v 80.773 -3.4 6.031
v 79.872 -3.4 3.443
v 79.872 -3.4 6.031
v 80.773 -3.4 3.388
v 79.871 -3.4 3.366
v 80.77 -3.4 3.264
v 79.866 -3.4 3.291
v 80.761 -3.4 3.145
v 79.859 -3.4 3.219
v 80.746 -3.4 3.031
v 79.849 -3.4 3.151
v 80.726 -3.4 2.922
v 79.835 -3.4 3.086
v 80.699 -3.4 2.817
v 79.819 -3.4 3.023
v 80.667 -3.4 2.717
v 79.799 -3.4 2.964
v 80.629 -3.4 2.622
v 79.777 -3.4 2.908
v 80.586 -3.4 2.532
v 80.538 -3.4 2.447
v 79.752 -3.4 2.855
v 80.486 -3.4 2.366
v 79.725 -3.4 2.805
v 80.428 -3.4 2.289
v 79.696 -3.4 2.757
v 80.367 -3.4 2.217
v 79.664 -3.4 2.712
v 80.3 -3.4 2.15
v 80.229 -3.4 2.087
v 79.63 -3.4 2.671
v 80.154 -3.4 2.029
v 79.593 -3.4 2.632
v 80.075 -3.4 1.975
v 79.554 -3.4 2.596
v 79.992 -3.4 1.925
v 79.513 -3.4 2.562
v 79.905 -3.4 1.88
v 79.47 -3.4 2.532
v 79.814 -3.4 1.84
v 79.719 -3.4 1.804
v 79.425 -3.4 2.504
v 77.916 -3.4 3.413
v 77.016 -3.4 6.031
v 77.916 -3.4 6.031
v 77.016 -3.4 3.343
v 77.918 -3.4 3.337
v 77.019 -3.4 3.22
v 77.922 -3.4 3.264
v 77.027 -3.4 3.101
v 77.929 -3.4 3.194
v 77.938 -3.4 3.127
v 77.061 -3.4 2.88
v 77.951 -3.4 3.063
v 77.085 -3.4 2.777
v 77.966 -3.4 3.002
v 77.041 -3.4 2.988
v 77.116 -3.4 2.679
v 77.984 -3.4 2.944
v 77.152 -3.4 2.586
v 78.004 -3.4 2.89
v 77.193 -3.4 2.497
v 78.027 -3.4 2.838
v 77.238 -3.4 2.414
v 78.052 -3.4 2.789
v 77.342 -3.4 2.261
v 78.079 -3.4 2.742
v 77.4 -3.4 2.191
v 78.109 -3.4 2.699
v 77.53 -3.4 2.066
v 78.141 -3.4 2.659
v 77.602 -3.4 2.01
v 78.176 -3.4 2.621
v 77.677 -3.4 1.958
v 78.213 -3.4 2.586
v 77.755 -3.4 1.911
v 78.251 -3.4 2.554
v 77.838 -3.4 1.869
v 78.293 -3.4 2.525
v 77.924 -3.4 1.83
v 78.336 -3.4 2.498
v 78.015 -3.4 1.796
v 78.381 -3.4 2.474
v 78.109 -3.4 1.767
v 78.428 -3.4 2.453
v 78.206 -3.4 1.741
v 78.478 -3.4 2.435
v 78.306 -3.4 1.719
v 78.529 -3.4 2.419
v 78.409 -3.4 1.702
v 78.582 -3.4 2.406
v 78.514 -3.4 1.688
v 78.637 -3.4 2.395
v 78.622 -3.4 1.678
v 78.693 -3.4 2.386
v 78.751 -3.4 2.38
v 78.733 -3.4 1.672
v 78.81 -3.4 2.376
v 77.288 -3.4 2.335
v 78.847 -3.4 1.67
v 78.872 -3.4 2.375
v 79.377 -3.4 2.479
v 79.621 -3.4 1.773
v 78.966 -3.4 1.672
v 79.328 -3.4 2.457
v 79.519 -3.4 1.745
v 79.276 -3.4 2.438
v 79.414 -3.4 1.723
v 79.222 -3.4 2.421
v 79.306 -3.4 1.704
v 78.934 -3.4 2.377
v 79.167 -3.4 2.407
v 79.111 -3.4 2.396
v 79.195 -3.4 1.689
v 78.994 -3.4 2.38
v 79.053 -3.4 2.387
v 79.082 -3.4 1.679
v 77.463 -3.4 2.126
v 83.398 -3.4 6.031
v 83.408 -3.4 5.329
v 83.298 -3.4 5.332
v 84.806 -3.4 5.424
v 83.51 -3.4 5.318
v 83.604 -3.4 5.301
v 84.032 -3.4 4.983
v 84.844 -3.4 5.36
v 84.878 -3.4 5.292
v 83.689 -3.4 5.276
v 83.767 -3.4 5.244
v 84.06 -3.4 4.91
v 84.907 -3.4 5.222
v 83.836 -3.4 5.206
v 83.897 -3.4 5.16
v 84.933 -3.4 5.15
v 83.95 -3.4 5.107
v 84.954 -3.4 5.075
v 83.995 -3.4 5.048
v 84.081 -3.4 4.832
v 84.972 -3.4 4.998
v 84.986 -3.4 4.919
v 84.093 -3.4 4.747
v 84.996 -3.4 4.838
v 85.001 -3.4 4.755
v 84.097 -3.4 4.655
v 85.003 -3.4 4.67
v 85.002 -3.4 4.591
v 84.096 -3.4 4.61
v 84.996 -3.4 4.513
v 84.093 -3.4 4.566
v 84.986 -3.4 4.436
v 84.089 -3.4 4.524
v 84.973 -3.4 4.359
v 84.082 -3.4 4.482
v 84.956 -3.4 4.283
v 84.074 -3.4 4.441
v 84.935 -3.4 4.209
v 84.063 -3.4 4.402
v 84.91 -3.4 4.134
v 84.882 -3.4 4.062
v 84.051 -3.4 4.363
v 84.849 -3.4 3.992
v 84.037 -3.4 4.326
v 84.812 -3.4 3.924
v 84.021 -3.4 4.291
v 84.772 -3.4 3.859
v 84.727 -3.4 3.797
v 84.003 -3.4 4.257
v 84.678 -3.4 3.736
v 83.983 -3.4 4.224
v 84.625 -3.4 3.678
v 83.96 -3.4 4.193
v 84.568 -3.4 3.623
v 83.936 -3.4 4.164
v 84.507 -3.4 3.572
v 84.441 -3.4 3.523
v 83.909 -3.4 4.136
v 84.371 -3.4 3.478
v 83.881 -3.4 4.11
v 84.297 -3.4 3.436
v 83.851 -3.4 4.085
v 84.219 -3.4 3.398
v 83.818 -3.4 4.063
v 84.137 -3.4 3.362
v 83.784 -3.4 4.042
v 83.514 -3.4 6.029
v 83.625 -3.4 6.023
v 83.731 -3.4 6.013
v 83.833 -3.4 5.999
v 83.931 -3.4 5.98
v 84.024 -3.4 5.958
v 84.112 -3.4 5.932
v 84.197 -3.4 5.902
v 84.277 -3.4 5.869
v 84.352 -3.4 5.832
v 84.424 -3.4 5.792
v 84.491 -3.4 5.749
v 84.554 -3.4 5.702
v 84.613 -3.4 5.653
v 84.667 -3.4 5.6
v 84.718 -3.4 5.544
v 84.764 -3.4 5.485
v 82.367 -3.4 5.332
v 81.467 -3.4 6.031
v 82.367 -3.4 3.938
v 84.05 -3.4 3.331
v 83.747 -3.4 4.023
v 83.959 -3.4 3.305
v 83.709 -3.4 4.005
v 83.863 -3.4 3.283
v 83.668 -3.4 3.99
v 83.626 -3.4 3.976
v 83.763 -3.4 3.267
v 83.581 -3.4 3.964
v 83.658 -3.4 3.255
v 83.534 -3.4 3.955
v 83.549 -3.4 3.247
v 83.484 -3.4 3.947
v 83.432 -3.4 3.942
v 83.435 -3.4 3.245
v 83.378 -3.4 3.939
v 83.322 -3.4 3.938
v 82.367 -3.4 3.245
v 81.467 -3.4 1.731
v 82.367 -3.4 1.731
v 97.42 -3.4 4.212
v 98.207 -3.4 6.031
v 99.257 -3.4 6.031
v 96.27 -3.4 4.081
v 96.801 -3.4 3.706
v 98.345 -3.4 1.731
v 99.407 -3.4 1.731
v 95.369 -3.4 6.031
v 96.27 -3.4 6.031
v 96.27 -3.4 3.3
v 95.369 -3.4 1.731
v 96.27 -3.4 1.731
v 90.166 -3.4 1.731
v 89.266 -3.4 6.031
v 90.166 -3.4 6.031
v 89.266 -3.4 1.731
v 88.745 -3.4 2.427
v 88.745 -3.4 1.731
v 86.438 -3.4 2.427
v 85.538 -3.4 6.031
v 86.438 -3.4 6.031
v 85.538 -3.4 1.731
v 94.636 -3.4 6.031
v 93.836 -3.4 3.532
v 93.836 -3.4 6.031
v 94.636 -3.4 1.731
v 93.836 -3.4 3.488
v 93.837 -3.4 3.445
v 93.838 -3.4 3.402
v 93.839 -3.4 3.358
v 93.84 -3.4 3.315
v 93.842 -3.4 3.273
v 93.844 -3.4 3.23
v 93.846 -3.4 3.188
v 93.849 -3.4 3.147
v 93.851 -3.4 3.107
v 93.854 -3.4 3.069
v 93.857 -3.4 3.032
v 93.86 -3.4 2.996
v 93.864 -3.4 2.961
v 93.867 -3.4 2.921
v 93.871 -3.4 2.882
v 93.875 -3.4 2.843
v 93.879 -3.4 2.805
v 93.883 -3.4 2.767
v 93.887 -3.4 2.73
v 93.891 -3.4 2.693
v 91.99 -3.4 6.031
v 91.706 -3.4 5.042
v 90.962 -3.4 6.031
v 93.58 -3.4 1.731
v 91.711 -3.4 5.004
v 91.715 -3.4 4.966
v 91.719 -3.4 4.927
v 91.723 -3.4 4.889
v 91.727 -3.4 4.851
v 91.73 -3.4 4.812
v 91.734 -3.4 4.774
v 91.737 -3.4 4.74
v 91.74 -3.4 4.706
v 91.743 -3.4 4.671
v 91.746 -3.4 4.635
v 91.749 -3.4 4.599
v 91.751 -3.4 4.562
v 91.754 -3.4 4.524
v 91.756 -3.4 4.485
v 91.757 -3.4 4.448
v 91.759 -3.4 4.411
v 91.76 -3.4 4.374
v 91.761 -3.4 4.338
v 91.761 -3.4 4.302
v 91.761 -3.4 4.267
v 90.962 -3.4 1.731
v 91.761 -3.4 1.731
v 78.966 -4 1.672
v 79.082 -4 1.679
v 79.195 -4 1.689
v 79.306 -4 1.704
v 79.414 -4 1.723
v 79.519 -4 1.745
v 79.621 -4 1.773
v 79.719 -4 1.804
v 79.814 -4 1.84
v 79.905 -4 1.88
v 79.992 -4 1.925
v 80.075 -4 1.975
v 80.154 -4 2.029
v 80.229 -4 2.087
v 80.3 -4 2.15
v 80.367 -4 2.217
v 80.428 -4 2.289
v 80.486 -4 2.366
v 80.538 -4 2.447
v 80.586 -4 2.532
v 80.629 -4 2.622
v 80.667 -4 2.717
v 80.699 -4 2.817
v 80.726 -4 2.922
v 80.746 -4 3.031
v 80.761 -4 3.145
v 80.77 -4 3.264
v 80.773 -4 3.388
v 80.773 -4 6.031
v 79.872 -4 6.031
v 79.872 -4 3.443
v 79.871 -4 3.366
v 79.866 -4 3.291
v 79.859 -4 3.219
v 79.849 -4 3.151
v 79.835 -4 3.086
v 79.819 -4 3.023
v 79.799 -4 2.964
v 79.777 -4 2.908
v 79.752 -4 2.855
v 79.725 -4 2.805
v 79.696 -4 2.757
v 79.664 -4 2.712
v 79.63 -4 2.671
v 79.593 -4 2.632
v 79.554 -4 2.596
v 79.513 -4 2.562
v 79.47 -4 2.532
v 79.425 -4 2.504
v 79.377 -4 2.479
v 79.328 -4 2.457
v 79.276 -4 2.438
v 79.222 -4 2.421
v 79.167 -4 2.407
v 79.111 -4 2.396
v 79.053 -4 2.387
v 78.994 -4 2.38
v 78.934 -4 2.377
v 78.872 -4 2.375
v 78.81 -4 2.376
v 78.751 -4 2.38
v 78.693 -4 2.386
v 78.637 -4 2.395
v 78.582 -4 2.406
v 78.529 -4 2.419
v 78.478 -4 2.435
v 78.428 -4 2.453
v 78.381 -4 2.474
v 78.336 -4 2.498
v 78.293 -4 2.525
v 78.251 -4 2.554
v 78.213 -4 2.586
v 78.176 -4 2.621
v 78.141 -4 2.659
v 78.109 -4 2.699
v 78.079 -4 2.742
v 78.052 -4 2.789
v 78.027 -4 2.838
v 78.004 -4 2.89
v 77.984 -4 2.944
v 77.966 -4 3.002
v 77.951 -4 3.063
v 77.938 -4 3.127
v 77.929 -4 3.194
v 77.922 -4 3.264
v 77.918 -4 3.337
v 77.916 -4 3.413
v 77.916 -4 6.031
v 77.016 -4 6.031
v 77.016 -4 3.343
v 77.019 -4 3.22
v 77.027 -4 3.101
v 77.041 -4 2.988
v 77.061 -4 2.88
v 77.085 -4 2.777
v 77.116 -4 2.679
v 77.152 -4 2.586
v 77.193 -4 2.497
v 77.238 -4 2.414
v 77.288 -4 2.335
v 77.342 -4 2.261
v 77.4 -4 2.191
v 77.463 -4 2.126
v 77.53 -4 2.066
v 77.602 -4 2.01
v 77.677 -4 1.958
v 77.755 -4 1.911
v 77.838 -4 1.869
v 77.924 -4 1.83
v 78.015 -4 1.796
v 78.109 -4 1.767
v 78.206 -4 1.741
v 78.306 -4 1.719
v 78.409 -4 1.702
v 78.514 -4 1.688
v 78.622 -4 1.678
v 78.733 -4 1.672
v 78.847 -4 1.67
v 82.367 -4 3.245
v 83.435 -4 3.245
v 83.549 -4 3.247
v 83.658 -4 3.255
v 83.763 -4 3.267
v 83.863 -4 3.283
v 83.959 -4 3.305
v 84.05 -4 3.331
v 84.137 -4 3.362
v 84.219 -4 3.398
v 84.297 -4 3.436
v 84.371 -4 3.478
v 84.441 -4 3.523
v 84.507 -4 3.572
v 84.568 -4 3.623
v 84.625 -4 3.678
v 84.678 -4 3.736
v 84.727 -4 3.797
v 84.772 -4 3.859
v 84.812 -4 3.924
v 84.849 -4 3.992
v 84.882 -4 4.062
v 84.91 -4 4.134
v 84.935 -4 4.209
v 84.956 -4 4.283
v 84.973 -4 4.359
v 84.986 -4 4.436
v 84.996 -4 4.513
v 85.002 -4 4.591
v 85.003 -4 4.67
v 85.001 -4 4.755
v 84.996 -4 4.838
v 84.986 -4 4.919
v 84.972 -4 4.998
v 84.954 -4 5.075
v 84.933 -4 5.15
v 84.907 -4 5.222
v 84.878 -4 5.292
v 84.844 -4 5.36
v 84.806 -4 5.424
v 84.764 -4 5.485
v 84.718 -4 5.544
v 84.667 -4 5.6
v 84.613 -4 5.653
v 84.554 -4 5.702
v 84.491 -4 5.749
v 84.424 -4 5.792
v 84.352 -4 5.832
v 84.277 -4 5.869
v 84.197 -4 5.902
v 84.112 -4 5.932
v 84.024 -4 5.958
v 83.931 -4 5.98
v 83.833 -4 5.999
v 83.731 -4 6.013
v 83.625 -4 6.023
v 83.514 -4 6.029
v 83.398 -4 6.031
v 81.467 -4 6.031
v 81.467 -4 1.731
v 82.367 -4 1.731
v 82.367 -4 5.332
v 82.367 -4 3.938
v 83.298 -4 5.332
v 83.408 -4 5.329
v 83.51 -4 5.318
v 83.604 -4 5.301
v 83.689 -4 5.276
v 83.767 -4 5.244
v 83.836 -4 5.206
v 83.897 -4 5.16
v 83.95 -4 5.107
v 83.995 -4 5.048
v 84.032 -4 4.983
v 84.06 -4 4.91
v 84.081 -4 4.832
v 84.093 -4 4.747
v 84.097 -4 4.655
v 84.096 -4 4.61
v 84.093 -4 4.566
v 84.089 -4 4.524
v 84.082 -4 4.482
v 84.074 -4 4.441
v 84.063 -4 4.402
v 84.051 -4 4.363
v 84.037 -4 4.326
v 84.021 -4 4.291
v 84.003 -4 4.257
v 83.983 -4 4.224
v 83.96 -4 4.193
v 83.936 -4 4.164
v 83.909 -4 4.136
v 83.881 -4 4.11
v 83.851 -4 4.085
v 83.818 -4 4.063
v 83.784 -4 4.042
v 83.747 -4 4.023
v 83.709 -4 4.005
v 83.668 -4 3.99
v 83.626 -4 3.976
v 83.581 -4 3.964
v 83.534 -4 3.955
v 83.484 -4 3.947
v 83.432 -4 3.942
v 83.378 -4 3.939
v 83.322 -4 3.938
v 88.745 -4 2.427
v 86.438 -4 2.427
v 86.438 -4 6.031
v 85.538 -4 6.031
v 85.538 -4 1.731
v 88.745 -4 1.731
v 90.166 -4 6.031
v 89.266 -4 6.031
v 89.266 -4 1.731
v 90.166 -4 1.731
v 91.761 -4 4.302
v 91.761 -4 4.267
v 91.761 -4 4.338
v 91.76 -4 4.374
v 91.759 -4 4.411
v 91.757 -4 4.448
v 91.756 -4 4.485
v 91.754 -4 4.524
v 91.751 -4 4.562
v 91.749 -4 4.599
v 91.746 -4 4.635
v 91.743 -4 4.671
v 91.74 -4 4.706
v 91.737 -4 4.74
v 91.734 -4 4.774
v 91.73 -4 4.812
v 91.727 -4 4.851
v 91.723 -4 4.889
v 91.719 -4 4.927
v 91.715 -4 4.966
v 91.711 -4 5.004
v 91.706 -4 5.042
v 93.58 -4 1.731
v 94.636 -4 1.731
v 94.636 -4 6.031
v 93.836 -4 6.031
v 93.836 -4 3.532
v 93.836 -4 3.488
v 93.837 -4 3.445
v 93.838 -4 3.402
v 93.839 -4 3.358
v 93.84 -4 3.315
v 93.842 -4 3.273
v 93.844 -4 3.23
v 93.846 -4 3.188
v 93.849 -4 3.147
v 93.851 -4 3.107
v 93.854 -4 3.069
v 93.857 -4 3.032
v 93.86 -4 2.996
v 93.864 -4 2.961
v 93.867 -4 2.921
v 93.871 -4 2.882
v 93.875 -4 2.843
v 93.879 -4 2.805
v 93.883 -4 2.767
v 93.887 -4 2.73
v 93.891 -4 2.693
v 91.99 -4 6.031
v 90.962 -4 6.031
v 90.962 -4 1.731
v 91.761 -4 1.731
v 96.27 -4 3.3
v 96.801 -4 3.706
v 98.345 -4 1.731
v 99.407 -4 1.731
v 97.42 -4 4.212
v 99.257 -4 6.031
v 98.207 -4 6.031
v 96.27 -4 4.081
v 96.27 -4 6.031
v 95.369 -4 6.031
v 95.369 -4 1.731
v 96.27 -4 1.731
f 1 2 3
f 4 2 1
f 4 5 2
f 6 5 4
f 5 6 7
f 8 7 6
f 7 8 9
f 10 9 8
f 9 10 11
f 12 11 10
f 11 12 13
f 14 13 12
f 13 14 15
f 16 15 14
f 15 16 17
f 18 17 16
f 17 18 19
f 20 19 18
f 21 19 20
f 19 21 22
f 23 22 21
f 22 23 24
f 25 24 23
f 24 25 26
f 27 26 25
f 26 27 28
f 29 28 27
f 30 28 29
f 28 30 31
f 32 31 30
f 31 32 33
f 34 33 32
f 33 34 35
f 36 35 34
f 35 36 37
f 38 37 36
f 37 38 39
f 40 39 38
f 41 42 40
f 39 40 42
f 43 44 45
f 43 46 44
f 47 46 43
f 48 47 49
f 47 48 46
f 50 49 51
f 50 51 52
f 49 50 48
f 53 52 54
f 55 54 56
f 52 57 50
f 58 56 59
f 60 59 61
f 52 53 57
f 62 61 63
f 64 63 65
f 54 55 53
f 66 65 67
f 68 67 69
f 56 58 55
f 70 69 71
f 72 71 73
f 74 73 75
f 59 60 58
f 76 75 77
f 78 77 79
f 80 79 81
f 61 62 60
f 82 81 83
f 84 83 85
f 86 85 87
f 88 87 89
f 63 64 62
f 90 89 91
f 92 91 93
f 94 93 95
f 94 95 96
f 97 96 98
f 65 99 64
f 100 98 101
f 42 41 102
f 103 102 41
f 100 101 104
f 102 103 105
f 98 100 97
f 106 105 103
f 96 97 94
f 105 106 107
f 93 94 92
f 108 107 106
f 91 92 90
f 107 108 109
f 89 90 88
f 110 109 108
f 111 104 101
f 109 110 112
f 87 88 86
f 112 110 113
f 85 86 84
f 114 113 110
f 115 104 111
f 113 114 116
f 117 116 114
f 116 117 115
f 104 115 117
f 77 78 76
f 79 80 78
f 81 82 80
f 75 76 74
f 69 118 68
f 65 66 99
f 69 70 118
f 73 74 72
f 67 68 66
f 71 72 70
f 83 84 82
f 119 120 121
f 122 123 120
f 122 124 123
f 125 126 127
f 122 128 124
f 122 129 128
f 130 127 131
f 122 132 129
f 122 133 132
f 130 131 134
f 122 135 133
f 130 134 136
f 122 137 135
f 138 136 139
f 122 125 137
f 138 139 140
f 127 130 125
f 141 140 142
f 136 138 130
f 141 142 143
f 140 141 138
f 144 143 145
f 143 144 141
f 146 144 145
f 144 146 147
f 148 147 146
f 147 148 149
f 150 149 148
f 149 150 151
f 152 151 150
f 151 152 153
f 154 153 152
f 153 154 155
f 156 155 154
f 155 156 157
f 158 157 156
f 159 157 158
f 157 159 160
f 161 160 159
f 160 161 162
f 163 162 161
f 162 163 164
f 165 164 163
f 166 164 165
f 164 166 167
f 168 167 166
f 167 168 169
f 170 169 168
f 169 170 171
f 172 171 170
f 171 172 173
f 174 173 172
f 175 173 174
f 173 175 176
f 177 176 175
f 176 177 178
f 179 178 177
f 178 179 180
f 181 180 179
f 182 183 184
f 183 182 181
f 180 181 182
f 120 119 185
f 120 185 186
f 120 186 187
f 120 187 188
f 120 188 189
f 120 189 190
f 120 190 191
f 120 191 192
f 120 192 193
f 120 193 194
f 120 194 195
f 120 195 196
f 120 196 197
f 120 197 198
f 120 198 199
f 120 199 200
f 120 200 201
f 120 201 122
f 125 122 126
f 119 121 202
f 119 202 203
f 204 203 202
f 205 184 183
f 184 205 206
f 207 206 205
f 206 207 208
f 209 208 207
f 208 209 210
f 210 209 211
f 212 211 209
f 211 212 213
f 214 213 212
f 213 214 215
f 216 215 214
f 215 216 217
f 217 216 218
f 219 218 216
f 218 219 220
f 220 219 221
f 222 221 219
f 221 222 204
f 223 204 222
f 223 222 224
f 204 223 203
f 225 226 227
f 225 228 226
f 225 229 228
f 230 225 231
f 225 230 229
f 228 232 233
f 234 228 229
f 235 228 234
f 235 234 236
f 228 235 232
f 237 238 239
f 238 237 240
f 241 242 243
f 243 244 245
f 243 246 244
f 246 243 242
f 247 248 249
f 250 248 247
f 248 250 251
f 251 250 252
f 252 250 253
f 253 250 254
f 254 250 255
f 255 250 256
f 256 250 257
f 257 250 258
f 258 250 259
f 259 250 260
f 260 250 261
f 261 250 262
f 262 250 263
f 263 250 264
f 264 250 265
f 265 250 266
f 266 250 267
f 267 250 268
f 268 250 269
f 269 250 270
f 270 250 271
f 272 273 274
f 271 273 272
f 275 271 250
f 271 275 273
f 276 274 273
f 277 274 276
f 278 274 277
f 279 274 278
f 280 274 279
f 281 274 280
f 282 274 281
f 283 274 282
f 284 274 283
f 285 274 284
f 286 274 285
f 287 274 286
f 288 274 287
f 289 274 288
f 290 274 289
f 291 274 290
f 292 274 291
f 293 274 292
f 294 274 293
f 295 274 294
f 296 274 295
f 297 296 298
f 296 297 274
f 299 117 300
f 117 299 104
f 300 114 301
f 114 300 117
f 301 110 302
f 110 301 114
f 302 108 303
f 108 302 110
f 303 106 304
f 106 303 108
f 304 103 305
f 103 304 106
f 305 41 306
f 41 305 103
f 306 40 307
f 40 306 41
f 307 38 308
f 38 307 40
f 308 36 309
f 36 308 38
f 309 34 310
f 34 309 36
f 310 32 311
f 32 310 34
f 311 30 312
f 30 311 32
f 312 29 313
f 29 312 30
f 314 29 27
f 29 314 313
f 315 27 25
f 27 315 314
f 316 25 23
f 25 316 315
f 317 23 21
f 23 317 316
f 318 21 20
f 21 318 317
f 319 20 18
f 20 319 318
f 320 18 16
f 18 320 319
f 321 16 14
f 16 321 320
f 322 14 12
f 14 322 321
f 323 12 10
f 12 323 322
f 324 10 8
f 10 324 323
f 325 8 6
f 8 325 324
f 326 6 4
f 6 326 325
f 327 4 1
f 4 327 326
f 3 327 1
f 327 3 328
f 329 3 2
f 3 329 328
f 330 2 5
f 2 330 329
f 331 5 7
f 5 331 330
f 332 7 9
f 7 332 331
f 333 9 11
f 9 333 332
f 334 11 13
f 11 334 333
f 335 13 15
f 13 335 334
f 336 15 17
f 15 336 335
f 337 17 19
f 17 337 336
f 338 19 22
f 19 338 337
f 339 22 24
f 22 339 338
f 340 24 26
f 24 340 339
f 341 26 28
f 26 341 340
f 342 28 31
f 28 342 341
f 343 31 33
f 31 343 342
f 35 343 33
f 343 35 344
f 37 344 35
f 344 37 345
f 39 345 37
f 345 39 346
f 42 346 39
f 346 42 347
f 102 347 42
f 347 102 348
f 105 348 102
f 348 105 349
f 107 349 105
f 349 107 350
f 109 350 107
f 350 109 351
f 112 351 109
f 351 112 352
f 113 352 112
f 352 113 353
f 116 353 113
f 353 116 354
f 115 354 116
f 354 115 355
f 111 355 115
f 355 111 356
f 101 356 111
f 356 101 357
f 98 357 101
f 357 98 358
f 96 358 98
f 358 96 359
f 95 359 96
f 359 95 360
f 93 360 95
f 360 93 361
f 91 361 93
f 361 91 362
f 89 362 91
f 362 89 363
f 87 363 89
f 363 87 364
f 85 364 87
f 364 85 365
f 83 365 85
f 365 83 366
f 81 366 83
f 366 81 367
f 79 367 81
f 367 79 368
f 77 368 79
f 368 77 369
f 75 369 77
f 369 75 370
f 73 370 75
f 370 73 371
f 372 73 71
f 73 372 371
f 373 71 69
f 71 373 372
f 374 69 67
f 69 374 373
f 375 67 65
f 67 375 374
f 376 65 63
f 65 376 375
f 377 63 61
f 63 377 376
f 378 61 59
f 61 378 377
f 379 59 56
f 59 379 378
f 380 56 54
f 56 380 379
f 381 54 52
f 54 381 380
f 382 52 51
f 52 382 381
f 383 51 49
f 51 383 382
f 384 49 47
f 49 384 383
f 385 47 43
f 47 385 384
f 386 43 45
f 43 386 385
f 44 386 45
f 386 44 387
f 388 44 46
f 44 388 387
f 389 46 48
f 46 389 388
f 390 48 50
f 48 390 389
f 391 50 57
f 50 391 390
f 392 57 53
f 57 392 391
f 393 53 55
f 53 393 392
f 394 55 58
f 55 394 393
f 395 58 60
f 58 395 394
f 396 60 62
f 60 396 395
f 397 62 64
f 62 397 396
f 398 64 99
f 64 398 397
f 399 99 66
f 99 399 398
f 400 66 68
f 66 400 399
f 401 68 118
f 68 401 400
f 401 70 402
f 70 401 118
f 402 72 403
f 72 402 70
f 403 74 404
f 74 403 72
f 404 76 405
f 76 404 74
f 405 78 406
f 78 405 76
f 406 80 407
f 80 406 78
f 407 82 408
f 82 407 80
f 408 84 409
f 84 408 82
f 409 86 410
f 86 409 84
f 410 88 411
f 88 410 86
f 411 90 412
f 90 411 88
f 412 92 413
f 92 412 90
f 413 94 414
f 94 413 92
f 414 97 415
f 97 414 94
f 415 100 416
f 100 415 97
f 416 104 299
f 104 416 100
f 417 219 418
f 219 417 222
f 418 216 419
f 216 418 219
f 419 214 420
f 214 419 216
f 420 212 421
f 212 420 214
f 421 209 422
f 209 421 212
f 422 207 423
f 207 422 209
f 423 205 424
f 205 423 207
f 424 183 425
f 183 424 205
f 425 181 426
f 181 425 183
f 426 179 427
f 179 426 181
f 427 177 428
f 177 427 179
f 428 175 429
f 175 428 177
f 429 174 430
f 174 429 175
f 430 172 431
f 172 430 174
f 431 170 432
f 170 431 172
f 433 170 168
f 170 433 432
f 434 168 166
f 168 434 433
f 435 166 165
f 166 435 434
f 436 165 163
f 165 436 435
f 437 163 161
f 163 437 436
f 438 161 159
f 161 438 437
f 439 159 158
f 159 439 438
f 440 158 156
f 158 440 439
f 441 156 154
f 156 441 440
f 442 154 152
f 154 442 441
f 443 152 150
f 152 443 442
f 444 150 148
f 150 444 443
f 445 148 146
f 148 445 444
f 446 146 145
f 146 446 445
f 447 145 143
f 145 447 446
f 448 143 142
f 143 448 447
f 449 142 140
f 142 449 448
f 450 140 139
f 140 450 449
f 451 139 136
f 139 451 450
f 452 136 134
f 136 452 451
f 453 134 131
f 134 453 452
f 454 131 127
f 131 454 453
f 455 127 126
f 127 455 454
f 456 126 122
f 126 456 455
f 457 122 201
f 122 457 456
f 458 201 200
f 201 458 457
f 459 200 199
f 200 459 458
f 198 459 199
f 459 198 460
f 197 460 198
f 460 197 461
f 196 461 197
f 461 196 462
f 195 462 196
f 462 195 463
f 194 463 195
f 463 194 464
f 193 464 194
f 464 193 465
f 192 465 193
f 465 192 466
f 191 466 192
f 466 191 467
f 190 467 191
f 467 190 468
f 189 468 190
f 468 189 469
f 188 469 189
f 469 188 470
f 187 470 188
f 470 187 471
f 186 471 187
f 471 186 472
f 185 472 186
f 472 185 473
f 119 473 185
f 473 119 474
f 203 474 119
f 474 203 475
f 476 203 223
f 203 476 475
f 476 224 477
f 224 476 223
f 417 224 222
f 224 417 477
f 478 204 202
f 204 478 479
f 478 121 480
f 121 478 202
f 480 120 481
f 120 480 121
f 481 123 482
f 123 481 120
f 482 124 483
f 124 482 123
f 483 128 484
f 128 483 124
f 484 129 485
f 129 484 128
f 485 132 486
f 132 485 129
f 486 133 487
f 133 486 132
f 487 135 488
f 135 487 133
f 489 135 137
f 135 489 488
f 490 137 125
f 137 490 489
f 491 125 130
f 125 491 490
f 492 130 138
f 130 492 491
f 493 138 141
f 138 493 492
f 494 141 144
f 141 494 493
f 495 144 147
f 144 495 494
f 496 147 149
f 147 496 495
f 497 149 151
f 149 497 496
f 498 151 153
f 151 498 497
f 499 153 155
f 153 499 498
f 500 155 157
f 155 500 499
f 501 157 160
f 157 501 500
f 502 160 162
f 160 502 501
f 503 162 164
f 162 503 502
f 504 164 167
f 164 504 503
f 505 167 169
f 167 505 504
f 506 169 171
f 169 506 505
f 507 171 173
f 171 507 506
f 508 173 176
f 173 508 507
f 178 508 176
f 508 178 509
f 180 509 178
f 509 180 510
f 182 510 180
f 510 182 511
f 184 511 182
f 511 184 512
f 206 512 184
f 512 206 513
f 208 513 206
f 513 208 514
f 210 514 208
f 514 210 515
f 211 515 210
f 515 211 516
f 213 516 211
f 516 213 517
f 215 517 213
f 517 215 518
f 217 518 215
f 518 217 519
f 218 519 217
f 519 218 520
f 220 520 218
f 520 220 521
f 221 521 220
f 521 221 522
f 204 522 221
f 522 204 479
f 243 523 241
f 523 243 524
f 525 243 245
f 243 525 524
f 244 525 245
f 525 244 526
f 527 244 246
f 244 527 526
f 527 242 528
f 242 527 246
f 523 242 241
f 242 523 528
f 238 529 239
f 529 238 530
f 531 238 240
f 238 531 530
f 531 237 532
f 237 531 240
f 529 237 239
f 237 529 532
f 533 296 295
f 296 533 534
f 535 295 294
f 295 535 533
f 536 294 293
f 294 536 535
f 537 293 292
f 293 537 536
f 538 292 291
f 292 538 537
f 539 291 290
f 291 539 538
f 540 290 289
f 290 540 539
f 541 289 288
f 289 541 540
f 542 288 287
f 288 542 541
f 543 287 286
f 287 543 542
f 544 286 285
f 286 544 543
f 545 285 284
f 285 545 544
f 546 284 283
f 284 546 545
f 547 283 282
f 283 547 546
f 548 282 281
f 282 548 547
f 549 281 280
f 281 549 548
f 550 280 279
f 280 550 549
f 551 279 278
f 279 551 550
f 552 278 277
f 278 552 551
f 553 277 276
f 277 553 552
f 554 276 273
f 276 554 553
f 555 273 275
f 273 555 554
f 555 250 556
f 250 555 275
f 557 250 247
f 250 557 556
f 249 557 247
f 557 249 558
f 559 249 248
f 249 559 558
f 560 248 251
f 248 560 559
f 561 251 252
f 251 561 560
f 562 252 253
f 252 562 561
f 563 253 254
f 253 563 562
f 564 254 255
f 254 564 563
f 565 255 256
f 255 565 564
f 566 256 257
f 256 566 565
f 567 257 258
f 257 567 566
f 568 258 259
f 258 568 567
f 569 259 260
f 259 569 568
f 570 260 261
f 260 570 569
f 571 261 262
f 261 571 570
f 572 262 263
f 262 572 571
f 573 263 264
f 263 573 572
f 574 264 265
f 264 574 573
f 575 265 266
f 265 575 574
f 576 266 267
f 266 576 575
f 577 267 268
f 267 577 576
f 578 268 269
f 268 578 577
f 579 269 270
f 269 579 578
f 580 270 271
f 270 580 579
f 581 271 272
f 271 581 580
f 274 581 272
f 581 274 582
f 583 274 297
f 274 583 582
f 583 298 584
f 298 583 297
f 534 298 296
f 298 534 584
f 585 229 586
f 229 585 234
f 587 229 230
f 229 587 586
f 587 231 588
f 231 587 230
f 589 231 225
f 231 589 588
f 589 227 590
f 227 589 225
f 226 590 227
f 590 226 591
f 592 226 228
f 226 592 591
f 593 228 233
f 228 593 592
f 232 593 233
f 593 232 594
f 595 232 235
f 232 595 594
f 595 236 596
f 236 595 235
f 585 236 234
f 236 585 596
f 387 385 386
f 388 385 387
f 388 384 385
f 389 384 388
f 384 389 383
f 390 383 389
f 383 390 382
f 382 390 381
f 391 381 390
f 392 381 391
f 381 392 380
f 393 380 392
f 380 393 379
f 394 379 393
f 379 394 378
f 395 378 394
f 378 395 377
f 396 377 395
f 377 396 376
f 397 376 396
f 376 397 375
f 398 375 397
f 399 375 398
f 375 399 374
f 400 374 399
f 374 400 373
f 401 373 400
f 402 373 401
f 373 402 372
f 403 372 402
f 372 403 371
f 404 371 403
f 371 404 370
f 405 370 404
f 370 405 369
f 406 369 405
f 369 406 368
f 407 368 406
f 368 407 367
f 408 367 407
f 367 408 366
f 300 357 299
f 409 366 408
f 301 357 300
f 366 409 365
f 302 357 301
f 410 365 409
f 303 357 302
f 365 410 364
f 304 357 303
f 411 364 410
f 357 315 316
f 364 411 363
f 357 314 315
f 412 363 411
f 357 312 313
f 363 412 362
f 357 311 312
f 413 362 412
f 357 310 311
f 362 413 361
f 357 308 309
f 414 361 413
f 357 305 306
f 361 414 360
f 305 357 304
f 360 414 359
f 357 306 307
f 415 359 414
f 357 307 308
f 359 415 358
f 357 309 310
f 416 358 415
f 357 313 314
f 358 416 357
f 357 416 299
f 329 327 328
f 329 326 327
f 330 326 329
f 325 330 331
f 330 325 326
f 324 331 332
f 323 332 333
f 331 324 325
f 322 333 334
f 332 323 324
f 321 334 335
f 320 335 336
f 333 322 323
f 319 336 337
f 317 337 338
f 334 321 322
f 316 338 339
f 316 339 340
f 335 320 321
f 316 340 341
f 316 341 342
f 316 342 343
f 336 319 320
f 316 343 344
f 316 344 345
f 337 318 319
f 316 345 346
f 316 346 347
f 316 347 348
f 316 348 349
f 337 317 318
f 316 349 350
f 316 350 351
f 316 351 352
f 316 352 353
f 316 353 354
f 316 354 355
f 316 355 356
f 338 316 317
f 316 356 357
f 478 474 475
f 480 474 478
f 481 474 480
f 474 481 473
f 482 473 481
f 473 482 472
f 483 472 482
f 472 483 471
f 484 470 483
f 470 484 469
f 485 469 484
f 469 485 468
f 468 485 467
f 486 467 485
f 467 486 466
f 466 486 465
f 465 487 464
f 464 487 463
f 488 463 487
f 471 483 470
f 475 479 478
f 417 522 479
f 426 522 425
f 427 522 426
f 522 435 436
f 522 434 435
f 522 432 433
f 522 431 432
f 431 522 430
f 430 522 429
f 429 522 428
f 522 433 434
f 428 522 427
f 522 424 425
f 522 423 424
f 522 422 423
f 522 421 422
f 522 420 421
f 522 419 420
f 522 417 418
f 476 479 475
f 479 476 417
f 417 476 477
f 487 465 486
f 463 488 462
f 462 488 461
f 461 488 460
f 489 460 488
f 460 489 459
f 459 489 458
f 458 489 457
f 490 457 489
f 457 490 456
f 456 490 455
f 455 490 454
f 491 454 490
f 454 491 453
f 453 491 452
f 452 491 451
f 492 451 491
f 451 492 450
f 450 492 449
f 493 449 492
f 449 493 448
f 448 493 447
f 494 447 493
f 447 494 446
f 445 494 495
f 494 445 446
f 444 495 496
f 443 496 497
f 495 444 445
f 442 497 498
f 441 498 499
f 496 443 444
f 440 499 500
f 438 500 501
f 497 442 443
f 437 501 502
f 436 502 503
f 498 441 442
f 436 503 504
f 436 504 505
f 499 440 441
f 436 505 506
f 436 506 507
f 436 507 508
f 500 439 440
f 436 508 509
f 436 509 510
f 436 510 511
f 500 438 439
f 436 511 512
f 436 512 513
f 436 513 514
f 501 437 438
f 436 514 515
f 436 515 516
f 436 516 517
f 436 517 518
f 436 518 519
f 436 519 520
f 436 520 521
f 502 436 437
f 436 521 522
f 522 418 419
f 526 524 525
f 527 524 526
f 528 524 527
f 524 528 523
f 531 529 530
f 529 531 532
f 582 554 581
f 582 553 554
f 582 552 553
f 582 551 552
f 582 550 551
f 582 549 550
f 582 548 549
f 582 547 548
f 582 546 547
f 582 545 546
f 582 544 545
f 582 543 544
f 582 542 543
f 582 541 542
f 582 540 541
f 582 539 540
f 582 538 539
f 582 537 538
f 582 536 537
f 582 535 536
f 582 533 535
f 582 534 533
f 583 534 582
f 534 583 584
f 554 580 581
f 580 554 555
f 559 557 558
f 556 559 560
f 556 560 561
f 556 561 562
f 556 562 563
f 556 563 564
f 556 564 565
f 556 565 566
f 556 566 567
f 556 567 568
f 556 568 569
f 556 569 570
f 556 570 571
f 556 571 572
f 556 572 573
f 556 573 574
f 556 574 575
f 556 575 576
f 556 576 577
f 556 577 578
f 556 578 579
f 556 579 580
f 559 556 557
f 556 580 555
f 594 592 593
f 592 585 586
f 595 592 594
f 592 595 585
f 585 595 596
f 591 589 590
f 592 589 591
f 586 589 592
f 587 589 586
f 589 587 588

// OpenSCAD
// Fills the 0.6 mm UPLINK engraving exactly (same text call as label_cut), front face Y=-4.
plate_t=4; $fn=48;
intersection(){
 translate([88,-plate_t-0.1,3.8])rotate([90,0,0])mirror([0,0,1])linear_extrude(height=0.7)text("UPLINK",size=4.5,font="Liberation Sans:style=Bold",halign="center",valign="center");
 translate([-200,-plate_t,-10])cube([400,0.6,100]);
}
